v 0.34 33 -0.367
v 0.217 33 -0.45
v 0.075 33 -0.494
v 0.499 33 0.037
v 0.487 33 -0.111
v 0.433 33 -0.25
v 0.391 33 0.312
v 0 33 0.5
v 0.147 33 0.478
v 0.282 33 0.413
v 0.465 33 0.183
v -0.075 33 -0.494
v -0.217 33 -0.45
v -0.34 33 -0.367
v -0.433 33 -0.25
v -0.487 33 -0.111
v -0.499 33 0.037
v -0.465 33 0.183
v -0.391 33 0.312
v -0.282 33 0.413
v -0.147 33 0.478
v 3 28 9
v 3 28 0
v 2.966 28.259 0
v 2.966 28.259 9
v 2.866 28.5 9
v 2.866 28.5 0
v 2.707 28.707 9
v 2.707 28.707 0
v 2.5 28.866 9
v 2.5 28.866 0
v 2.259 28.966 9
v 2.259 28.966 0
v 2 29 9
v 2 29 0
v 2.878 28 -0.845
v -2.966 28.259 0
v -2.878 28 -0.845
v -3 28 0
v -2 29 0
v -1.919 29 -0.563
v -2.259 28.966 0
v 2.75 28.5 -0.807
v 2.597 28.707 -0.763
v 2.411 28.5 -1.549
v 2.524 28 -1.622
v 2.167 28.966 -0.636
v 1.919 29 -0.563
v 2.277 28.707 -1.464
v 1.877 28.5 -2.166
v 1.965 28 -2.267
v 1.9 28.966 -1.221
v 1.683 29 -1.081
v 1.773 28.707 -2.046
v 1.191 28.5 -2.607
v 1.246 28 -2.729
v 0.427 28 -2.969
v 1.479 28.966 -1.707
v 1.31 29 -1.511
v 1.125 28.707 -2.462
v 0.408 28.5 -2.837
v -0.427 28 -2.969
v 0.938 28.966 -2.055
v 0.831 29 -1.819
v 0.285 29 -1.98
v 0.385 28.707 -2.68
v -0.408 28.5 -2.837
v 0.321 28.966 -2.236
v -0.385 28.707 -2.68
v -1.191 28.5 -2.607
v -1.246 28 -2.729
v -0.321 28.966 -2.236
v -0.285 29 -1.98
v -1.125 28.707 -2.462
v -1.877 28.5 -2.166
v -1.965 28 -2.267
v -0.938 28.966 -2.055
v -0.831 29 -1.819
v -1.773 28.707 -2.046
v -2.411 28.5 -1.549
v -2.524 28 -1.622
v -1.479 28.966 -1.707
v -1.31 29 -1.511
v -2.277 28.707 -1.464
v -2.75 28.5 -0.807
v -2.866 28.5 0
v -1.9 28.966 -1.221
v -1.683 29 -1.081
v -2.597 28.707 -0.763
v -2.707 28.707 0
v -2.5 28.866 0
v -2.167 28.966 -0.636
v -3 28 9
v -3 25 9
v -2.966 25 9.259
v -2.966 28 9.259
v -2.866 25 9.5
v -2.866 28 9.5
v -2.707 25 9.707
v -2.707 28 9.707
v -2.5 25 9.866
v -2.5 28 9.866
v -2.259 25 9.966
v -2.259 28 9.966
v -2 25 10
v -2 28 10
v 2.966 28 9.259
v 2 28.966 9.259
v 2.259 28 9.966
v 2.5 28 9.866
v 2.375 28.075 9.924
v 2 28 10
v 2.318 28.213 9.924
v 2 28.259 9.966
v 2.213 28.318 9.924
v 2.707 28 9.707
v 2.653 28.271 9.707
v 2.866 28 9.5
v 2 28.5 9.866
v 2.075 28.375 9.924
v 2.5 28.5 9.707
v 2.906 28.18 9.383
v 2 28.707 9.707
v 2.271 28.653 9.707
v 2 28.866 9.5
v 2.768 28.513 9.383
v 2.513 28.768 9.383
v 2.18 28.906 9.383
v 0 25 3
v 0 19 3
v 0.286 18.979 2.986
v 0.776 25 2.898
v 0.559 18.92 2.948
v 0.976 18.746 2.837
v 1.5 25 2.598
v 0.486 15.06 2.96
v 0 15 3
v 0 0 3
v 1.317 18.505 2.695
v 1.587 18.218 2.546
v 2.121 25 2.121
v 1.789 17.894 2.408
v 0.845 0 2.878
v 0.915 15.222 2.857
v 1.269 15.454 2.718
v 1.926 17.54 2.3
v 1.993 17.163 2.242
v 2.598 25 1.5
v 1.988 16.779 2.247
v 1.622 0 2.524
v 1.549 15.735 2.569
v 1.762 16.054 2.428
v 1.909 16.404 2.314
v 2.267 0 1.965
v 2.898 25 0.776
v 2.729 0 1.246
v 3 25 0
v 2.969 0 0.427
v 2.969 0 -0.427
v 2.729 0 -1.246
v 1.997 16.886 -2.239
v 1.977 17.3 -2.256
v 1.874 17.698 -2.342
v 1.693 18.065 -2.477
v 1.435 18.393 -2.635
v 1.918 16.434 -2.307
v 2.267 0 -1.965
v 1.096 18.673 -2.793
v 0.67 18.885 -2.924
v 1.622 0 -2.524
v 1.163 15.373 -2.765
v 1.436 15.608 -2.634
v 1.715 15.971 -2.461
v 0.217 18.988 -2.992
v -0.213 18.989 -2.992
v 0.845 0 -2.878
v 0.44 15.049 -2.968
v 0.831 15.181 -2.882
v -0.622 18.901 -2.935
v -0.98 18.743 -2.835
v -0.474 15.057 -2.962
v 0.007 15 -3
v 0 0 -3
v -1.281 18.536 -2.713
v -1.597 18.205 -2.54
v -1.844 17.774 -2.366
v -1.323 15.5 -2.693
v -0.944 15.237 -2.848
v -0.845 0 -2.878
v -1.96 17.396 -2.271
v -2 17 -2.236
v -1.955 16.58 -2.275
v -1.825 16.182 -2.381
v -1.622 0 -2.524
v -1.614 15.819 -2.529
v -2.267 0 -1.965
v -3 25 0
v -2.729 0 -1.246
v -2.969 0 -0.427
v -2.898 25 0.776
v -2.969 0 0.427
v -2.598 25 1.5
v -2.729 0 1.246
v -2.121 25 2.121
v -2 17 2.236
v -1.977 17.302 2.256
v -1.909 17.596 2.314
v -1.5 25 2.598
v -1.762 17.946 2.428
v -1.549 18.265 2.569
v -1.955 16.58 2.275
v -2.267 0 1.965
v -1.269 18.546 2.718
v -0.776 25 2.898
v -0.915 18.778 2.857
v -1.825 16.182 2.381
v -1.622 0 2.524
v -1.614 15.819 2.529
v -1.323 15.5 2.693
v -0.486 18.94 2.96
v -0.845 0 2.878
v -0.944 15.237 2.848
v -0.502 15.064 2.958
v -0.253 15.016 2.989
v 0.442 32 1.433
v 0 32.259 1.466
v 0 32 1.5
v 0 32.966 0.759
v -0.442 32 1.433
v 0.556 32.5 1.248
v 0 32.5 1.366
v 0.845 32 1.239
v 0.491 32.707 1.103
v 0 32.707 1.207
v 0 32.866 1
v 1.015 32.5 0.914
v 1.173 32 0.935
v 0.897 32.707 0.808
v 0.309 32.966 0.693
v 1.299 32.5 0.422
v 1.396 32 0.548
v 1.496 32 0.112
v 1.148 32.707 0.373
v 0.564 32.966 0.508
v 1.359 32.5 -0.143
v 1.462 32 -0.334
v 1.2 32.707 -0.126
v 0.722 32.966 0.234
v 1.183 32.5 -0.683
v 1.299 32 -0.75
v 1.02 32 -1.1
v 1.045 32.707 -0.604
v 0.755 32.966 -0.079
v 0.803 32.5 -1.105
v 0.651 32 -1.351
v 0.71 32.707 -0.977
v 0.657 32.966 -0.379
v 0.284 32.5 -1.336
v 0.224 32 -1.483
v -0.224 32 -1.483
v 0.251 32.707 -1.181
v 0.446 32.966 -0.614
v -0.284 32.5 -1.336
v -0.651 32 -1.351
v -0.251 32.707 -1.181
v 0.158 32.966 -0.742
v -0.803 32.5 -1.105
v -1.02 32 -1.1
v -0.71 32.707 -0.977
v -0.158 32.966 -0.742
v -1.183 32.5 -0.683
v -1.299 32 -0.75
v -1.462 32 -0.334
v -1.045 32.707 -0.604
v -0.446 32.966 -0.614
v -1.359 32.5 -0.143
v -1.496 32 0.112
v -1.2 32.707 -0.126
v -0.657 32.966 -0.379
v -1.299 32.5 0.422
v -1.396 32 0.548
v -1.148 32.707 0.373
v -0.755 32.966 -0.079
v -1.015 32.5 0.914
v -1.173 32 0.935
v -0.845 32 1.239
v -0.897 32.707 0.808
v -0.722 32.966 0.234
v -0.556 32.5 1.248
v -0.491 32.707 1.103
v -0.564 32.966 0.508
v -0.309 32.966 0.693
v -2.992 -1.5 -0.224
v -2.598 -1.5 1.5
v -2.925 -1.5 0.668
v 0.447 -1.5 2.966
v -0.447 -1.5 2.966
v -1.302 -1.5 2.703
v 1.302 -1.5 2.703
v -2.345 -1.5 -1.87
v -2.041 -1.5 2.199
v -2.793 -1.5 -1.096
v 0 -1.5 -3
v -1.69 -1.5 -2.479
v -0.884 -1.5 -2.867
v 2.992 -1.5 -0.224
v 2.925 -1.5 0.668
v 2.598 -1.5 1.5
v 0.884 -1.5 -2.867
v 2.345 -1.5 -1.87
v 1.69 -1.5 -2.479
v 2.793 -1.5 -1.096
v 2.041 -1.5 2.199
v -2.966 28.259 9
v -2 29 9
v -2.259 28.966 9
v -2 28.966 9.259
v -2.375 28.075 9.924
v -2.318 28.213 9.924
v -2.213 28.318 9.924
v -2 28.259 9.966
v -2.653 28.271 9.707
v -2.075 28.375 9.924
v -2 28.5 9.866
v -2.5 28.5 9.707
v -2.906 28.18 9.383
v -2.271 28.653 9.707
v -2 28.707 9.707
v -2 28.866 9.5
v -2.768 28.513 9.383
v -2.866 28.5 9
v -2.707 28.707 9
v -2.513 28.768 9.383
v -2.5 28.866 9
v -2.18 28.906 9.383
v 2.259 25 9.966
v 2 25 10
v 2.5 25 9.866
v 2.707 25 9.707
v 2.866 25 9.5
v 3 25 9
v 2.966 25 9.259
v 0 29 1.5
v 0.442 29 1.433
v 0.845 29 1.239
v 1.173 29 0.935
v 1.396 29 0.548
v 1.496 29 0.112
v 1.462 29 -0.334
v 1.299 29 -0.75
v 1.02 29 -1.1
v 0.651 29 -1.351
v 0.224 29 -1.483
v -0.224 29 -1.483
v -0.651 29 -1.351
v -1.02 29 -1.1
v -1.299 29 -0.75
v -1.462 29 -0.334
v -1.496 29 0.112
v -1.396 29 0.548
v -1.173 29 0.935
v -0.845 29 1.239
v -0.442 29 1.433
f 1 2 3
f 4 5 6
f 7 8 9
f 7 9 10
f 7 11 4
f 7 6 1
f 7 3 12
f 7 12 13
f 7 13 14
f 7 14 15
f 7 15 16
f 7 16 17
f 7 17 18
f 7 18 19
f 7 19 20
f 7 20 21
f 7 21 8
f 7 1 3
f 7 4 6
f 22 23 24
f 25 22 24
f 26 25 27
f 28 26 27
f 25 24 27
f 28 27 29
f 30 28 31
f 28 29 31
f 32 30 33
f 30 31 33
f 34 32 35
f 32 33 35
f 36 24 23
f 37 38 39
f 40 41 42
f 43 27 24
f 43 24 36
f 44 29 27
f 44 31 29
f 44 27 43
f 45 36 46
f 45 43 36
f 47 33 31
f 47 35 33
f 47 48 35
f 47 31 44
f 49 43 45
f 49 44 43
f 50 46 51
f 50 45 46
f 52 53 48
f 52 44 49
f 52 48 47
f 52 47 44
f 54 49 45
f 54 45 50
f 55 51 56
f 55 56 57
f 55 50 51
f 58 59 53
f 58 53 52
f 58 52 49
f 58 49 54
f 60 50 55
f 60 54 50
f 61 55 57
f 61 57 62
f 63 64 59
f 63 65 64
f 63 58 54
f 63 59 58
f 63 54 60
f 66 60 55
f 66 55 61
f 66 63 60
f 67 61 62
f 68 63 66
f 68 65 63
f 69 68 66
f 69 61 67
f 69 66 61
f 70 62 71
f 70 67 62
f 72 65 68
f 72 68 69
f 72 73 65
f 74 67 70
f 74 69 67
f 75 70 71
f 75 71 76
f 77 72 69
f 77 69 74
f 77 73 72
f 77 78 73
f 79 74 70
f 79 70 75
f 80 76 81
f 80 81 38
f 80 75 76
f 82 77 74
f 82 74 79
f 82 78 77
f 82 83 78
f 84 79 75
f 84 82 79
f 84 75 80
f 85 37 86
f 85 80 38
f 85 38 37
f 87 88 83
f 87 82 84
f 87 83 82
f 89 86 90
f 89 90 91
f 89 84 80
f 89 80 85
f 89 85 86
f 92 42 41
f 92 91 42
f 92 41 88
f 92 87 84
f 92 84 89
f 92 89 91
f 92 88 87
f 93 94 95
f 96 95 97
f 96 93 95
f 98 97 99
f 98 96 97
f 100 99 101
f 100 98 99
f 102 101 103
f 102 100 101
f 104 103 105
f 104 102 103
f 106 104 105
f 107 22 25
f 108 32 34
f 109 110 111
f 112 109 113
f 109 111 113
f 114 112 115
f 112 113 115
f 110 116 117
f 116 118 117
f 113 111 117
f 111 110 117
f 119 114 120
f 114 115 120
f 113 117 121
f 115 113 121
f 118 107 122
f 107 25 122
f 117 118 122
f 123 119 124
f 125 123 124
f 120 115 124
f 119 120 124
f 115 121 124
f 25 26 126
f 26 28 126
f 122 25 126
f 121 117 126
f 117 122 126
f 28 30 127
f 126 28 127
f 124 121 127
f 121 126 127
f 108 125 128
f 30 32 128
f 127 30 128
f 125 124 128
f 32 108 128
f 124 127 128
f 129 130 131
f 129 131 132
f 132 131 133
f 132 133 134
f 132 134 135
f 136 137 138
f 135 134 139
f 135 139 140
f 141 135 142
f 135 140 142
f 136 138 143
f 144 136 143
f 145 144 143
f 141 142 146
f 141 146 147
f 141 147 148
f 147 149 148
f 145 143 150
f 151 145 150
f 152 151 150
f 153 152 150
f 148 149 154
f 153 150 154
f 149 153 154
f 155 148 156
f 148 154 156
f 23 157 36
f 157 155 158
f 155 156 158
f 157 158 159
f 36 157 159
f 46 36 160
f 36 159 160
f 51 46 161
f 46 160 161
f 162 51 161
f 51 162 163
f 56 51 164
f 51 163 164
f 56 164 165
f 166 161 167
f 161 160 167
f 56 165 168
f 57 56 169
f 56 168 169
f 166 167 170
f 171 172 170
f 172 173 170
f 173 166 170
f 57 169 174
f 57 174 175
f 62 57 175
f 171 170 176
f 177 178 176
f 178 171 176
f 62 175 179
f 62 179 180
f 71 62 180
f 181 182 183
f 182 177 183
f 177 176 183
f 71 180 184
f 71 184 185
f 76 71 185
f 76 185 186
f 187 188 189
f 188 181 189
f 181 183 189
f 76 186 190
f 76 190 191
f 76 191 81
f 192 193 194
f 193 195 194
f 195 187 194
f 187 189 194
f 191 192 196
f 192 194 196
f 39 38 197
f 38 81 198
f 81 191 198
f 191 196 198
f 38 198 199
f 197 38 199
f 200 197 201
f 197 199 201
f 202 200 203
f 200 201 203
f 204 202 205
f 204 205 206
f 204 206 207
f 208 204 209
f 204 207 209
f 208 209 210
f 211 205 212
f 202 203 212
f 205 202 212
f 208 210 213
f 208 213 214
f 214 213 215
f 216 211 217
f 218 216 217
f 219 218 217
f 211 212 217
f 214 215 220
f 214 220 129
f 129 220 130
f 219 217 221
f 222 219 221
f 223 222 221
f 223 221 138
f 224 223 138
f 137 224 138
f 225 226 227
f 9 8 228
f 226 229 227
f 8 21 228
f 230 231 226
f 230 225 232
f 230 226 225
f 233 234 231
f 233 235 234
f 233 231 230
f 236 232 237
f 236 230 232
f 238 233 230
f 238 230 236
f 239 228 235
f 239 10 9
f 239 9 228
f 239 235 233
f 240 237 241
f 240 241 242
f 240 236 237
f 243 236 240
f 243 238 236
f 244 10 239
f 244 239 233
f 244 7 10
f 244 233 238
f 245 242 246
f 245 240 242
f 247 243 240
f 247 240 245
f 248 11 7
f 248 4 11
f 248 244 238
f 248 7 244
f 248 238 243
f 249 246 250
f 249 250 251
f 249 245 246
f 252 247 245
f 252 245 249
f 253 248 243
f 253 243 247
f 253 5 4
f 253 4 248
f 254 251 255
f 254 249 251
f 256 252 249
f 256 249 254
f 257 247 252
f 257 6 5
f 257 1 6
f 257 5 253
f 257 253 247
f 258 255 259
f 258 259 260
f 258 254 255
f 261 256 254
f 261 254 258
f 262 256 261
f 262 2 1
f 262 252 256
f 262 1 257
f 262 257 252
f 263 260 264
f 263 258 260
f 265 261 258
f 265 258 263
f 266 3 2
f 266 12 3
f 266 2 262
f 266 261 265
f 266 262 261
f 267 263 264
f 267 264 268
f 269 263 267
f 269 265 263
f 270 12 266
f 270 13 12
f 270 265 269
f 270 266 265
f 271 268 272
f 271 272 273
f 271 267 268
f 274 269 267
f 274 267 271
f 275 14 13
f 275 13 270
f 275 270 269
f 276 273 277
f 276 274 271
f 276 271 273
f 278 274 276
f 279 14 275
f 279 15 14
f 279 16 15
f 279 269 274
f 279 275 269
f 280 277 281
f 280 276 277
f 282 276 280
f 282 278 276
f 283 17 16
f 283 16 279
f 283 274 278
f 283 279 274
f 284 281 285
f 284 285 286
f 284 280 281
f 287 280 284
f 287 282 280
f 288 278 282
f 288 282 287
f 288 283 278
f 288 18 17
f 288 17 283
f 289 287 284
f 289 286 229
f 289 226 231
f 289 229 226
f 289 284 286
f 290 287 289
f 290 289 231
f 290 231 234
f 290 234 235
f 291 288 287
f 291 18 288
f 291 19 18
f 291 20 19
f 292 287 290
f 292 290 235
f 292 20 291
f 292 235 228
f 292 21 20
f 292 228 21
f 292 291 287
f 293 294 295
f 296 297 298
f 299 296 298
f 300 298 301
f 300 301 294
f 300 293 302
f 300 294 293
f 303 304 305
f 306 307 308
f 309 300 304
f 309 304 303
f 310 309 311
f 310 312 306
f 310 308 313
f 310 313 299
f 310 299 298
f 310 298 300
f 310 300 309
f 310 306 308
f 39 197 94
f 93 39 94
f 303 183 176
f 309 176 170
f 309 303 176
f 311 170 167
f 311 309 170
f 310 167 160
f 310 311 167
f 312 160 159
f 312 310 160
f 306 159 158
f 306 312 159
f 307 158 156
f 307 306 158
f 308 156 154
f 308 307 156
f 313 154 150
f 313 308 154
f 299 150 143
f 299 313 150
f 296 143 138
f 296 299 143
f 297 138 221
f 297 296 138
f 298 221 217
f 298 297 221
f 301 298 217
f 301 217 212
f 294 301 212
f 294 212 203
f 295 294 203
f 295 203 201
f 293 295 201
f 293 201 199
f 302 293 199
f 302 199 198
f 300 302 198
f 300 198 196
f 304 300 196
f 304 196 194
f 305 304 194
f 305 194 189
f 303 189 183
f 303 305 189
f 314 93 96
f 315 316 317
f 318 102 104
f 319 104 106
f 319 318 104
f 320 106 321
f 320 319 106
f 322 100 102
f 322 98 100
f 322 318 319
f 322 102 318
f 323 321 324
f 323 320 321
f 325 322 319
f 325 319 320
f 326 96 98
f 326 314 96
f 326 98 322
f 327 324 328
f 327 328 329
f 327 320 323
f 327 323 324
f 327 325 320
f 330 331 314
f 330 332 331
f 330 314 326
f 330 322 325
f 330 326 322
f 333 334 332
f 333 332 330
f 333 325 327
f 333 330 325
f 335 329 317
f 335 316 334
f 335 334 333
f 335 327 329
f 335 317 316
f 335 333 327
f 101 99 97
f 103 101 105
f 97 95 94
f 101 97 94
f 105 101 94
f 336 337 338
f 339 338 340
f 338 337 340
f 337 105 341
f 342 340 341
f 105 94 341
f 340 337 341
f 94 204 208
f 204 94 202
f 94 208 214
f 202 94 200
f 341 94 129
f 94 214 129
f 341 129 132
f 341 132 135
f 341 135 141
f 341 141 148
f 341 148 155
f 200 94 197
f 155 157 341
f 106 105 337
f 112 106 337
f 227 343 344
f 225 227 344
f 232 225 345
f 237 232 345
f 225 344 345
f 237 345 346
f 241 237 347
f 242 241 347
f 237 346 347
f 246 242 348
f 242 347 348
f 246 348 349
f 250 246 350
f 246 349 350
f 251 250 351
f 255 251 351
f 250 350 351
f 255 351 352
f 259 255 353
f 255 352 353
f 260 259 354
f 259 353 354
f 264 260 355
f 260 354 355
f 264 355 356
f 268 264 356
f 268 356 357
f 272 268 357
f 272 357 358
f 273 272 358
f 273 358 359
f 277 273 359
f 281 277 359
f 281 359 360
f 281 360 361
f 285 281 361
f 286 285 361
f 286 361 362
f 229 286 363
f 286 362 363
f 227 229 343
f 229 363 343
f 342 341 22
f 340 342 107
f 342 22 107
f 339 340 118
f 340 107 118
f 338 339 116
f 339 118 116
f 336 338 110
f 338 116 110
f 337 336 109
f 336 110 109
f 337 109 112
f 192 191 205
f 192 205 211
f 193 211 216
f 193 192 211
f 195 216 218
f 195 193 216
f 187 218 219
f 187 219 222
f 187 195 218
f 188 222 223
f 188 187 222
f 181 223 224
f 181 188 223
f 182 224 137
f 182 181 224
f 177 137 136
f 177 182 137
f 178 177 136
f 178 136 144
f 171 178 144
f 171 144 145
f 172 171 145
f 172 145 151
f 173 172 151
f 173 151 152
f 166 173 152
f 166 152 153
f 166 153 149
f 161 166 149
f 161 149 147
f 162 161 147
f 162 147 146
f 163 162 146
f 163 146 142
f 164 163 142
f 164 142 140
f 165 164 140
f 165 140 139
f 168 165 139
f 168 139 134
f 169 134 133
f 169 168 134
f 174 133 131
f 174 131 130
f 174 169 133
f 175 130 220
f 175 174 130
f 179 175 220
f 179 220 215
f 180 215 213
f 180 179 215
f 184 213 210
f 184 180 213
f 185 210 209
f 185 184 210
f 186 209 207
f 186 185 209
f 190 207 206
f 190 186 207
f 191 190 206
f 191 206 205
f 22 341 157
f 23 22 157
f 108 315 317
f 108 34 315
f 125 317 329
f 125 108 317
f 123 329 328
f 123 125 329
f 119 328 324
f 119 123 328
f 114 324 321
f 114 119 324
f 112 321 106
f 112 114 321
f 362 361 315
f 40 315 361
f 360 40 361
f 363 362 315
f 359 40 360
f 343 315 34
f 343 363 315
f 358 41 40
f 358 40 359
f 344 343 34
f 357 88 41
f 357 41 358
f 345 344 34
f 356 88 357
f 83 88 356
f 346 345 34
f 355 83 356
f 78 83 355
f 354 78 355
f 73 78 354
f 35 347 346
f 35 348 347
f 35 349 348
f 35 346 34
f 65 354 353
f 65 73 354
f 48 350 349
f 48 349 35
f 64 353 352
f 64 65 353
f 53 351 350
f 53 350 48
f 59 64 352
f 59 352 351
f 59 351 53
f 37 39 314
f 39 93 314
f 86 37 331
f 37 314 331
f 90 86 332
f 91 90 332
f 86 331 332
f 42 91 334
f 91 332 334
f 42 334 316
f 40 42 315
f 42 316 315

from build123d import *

# Parameters (mm, degrees)
SKETCH2_R               = 3
BOSS_EXTRUDE1_DEPTH     = 25
BOSS_EXTRUDE2_DEPTH     = 4
SKETCH5_R               = 3
BOSS_EXTRUDE3_DEPTH     = 4
FILLET1_R               = 1
CUT_EXTRUDE1_DEPTH      = 4
CUT_EXTRUDE1_DEPTH_BACK = 4
SKETCH6_R               = 2
SKETCH7_R               = 1.5
BOSS_EXTRUDE4_DEPTH     = 4
FILLET2_R               = 1
BOSS_EXTRUDE5_START     = 1.5
SKETCH8_R               = 3
BOSS_EXTRUDE5_DEPTH     = 1.5


with BuildPart() as part:
    # Sketch2 → Boss-Extrude1 (new body)
    with BuildSketch(Plane(origin=(0, 0, 0), x_dir=(1, 0, 0), z_dir=(0, 1, 0))):
        with Locations(Location((0, 0, 0), (0, 0, 270))):
            Circle(SKETCH2_R)
    extrude(amount=BOSS_EXTRUDE1_DEPTH)



with BuildPart() as body_2:
    # Sketch4 → Boss-Extrude2 (new body)
    with BuildSketch(Plane(origin=(0, 25, 0), x_dir=(1, 0, 0), z_dir=(0, 1, 0))):
        with BuildLine():
            Line((-3, 0), (-3, -10))
            Line((-3, -10), (3, -10))
            Line((3, -10), (3, 0))
            ThreePointArc((3, 0), (0, -3), (-3, 0))
        make_face()
    extrude(amount=BOSS_EXTRUDE2_DEPTH)


with BuildPart() as part_1:
    add(part.part)

    add(body_2.part)  # Boss-Extrude3 merges body 2
    # Sketch5 → Boss-Extrude3 (add)
    with BuildSketch(Plane(origin=(0, 25, 0), x_dir=(1, 0, 0), z_dir=(0, 1, 0))):
        Circle(SKETCH5_R)
    extrude(amount=BOSS_EXTRUDE3_DEPTH)

    # Fillet1
    fillet1_edges = [part_1.edges().sort_by_distance(p)[0] for p in [
        (0, 29, -3),
        (3, 27, 10),
        (-3, 27, 10),
        (3, 29, 5),
        (-3, 29, 5),
        (0, 29, 10),
    ]]
    fillet(fillet1_edges, radius=FILLET1_R)

    # Sketch6 → Cut-Extrude1 (cut, two sides: drawn at the far end of the back side and taken through both)
    with BuildSketch(Plane.XY.offset(-CUT_EXTRUDE1_DEPTH_BACK)):
        with Locations(Location((0, 17, 0), (0, 0, 180))):
            Circle(SKETCH6_R)
    extrude(amount=CUT_EXTRUDE1_DEPTH + CUT_EXTRUDE1_DEPTH_BACK, mode=Mode.SUBTRACT)

    # Sketch7 → Boss-Extrude4 (add)
    with BuildSketch(Plane(origin=(0, 29, 0), x_dir=(1, 0, 0), z_dir=(0, 1, 0))):
        with Locations(Location((0, 0, 0), (0, 0, 270))):
            Circle(SKETCH7_R)
    extrude(amount=BOSS_EXTRUDE4_DEPTH)

    # Fillet2
    fillet2_edges = [part_1.edges().sort_by_distance(p)[0] for p in [
        (0, 33, -1.5),
    ]]
    fillet(fillet2_edges, radius=FILLET2_R)

    # Sketch8 → Boss-Extrude5 (add)
    with BuildSketch(Plane(origin=(0, 0, 0), x_dir=(-1, 0, 0), z_dir=(0, -1, 0)).offset(BOSS_EXTRUDE5_START)):
        with Locations(Location((0, 0, 0), (0, 0, 90))):
            Circle(SKETCH8_R)
    extrude(amount=-BOSS_EXTRUDE5_DEPTH)


solid = part_1.part
